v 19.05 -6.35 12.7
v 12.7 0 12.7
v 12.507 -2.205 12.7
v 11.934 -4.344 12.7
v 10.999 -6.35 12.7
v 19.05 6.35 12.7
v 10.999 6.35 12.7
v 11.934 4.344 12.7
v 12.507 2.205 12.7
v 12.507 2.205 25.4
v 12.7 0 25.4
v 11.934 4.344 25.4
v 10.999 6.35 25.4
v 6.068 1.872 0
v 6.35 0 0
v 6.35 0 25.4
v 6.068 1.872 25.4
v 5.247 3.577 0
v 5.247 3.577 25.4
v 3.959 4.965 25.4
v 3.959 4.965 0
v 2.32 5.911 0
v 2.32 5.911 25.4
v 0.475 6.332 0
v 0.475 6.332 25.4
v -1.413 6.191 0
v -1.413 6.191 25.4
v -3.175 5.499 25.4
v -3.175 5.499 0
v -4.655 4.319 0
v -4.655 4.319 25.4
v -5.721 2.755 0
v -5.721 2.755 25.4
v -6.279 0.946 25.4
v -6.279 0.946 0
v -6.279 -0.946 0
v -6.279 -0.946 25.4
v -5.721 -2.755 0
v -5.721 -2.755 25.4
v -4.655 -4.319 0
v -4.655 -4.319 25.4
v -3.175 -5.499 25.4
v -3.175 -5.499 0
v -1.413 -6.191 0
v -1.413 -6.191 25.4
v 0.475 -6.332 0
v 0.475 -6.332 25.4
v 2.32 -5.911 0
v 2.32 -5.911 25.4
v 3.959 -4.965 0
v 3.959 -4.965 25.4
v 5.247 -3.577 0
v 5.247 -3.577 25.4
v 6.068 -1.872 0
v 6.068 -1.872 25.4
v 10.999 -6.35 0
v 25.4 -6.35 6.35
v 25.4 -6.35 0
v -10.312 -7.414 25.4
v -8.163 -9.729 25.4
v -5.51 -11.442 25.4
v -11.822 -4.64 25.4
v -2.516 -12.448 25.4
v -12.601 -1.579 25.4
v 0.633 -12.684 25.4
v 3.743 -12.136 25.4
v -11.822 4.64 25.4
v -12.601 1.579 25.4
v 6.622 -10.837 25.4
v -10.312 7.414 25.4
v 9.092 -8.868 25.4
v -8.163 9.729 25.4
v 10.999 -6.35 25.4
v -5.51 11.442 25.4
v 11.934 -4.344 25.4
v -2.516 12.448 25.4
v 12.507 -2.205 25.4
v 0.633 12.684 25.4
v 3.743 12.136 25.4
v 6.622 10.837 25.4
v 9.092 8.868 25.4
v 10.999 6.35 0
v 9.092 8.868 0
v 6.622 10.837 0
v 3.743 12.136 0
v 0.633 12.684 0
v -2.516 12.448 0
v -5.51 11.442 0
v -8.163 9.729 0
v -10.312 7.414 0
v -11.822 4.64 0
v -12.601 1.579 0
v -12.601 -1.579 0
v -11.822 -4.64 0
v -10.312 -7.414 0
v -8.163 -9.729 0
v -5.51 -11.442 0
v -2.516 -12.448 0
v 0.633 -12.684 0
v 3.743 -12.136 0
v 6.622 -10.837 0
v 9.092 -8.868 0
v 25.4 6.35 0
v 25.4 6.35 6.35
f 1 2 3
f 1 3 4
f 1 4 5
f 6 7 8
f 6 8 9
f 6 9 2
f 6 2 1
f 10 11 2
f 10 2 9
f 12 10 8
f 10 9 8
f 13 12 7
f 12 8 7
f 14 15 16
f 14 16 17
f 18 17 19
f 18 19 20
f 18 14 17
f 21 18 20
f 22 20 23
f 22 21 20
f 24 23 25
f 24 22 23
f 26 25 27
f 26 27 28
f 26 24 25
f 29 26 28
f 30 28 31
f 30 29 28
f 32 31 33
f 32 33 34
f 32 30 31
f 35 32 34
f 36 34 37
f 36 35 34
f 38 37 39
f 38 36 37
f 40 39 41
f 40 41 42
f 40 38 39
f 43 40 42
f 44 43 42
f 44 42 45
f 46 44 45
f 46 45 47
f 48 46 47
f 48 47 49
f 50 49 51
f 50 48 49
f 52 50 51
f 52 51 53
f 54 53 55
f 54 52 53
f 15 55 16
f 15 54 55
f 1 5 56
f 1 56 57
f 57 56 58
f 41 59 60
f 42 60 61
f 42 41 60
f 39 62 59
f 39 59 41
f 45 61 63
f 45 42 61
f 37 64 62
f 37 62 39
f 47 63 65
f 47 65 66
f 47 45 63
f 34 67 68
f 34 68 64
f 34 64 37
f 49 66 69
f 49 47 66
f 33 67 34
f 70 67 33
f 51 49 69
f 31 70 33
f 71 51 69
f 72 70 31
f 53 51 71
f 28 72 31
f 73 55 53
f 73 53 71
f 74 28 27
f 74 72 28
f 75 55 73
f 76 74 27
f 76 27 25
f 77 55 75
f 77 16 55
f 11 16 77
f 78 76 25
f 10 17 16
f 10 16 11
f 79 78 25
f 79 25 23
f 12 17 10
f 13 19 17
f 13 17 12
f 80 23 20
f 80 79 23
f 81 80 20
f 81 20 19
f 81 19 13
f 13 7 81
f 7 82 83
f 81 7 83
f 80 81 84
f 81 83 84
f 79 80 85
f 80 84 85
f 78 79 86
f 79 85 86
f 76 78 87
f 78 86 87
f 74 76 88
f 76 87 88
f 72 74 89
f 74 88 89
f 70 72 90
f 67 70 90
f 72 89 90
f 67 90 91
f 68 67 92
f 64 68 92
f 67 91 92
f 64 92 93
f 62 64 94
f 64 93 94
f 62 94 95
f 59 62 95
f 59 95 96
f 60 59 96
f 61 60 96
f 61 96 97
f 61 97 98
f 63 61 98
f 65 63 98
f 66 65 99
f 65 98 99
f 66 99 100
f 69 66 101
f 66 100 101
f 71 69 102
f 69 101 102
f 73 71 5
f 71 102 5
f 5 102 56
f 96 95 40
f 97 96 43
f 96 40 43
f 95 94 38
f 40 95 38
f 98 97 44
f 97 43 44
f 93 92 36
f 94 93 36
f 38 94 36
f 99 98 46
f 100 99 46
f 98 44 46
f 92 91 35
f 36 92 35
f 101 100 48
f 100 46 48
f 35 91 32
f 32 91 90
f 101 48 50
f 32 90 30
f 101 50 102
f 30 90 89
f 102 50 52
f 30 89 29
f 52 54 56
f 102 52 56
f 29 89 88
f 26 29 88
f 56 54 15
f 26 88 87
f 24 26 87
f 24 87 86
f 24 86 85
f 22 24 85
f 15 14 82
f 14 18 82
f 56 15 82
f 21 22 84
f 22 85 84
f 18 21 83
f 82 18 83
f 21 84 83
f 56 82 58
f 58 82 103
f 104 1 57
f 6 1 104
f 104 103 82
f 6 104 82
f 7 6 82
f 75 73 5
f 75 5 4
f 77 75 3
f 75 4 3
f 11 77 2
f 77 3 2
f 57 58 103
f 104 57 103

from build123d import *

# Parameters (mm, degrees)
F0_R     = 6.35
F1_DEPTH = 25.4
F0_W     = 6.35
F0_H     = 6.35
F2_DEPTH = 12.7
F3_SIZE  = 6.35


with BuildPart() as f1:
    # F0 (on Top) → F1 (new body)
    with BuildSketch(Plane.XY):
        with BuildLine():
            ThreePointArc((10.9985226281, -6.35), (12.2672579939, -3.2870018728), (12.7, 0))
            ThreePointArc((12.7, 0), (12.2672579939, 3.2870018728), (10.9985226281, 6.35))
            ThreePointArc((10.9985226281, 6.35), (-12.7, 0), (10.9985226281, -6.35))
        make_face()
        Circle(F0_R, mode=Mode.SUBTRACT)
    extrude(amount=F1_DEPTH)

    # F0 (on Top) → F2 (join)
    with BuildSketch(Plane.XY):
        with BuildLine():
            Line((19.05, 0), (12.7, 0))
            ThreePointArc((12.7, 0), (12.2672579939, -3.2870018728), (10.9985226281, -6.35))
            Line((10.9985226281, -6.35), (19.05, -6.35))
            Line((19.05, -6.35), (19.05, 0))
        make_face()
        with BuildLine():
            ThreePointArc((10.9985226281, 6.35), (12.2672579939, 3.2870018728), (12.7, 0))
            Line((12.7, 0), (19.05, 0))
            Line((19.05, 0), (19.05, 6.35))
            Line((19.05, 6.35), (10.9985226281, 6.35))
        make_face()
        with Locations((22.225, 3.175)):
            Rectangle(F0_W, F0_H)
        with Locations((22.225, -3.175)):
            Rectangle(F0_W, F0_H)
    extrude(amount=F2_DEPTH)

    # F3
    f3_edges = [f1.edges().sort_by_distance(p)[0] for p in [
        (25.4, 0, 12.7),
    ]]
    chamfer(f3_edges, length=F3_SIZE)


solid = f1.part
